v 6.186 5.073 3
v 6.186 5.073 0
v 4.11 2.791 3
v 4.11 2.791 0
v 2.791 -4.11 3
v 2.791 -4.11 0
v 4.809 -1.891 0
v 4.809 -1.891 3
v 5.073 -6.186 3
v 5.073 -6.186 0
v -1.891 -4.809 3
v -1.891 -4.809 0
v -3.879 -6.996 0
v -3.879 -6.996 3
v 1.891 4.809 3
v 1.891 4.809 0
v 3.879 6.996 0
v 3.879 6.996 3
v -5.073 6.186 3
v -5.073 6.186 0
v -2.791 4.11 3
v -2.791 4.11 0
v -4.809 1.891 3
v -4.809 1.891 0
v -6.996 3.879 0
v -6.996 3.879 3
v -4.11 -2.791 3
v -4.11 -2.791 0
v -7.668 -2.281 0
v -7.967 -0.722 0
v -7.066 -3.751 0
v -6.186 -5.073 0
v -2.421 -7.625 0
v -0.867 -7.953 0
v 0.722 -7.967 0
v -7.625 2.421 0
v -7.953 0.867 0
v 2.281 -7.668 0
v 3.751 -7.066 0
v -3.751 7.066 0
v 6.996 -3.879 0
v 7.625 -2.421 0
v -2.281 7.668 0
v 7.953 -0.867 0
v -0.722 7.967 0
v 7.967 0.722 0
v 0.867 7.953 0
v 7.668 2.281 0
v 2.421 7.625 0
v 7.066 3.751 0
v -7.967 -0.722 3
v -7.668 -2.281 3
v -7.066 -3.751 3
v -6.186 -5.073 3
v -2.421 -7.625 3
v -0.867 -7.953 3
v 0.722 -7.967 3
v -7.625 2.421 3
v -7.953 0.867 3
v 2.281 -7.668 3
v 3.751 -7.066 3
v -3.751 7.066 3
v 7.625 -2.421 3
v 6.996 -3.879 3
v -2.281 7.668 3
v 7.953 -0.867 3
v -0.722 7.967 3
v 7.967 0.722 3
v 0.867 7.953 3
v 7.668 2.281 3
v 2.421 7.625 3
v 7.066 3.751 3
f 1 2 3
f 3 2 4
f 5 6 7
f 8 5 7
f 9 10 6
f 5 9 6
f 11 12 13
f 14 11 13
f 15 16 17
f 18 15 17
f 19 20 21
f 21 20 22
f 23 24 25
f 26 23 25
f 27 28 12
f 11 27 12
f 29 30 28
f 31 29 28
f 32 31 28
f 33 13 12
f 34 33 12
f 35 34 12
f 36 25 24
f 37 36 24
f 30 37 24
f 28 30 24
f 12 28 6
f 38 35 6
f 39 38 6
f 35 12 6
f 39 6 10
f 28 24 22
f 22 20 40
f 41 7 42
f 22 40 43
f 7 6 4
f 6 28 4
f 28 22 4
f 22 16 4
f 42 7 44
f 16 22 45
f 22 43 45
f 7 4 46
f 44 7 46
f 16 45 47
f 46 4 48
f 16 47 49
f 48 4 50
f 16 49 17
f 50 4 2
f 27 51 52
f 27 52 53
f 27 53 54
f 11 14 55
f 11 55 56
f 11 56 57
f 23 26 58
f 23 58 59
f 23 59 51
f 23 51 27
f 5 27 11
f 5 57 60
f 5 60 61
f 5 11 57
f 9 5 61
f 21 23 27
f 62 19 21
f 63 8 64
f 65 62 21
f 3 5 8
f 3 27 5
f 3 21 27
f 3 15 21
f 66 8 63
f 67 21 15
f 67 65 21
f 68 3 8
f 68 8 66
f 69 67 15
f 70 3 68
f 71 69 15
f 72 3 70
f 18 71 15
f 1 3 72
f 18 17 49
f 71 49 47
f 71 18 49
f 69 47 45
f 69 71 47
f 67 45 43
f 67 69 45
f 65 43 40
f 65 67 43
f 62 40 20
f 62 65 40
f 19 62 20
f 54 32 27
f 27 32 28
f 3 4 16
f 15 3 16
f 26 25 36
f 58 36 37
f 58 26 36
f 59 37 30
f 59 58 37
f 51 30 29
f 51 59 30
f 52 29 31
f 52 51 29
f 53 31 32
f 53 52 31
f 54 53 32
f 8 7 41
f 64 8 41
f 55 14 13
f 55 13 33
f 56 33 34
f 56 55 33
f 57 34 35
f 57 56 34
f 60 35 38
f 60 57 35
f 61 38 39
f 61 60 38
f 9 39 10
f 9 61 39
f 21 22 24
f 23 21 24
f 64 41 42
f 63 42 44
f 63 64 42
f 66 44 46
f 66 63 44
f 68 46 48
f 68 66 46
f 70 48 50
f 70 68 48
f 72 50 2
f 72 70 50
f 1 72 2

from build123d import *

# Parameters (mm, degrees)
SALIENTE_EXTRUIR3_DEPTH = 3
CROQUIS4_R              = 10
CROQUIS4_R_2            = 8
CORTAR_EXTRUIR4_DEPTH   = 4


with BuildPart() as part:
    # Croquis3 → Saliente-Extruir3 (new body)
    with BuildSketch(Plane.XY):
        with BuildLine():
            Line((-1.890656386, -4.808889521), (-5.254187971, -8.508437504))
            ThreePointArc((-5.254187971, -8.508437504), (0.814446084, -9.966778696), (6.565812029, -7.54255344))
            Line((6.565812029, -7.54255344), (2.790770571, -4.110385176))
            Line((2.790770571, -4.110385176), (4.808889521, -1.890656386))
            Line((4.808889521, -1.890656386), (8.508437504, -5.254187971))
            ThreePointArc((8.508437504, -5.254187971), (9.966778696, 0.814446084), (7.54255344, 6.565812029))
            Line((7.54255344, 6.565812029), (4.110385176, 2.790770571))
            Line((4.110385176, 2.790770571), (1.890656386, 4.808889521))
            Line((1.890656386, 4.808889521), (5.254187971, 8.508437504))
            ThreePointArc((5.254187971, 8.508437504), (-0.814446084, 9.966778696), (-6.565812029, 7.54255344))
            Line((-6.565812029, 7.54255344), (-2.790770571, 4.110385176))
            Line((-2.790770571, 4.110385176), (-4.808889521, 1.890656386))
            Line((-4.808889521, 1.890656386), (-8.508437504, 5.254187971))
            ThreePointArc((-8.508437504, 5.254187971), (-9.966778696, -0.814446084), (-7.54255344, -6.565812029))
            Line((-7.54255344, -6.565812029), (-4.110385176, -2.790770571))
            Line((-4.110385176, -2.790770571), (-1.890656386, -4.808889521))
        make_face()
    extrude(amount=SALIENTE_EXTRUIR3_DEPTH)

    # Croquis4 → Cortar-Extruir4 (cut, through all)
    with BuildSketch(Plane.XY.offset(3)):
        Circle(CROQUIS4_R)
        Circle(CROQUIS4_R_2, mode=Mode.SUBTRACT)
    extrude(amount=-CORTAR_EXTRUIR4_DEPTH, mode=Mode.SUBTRACT)


solid = part.part
